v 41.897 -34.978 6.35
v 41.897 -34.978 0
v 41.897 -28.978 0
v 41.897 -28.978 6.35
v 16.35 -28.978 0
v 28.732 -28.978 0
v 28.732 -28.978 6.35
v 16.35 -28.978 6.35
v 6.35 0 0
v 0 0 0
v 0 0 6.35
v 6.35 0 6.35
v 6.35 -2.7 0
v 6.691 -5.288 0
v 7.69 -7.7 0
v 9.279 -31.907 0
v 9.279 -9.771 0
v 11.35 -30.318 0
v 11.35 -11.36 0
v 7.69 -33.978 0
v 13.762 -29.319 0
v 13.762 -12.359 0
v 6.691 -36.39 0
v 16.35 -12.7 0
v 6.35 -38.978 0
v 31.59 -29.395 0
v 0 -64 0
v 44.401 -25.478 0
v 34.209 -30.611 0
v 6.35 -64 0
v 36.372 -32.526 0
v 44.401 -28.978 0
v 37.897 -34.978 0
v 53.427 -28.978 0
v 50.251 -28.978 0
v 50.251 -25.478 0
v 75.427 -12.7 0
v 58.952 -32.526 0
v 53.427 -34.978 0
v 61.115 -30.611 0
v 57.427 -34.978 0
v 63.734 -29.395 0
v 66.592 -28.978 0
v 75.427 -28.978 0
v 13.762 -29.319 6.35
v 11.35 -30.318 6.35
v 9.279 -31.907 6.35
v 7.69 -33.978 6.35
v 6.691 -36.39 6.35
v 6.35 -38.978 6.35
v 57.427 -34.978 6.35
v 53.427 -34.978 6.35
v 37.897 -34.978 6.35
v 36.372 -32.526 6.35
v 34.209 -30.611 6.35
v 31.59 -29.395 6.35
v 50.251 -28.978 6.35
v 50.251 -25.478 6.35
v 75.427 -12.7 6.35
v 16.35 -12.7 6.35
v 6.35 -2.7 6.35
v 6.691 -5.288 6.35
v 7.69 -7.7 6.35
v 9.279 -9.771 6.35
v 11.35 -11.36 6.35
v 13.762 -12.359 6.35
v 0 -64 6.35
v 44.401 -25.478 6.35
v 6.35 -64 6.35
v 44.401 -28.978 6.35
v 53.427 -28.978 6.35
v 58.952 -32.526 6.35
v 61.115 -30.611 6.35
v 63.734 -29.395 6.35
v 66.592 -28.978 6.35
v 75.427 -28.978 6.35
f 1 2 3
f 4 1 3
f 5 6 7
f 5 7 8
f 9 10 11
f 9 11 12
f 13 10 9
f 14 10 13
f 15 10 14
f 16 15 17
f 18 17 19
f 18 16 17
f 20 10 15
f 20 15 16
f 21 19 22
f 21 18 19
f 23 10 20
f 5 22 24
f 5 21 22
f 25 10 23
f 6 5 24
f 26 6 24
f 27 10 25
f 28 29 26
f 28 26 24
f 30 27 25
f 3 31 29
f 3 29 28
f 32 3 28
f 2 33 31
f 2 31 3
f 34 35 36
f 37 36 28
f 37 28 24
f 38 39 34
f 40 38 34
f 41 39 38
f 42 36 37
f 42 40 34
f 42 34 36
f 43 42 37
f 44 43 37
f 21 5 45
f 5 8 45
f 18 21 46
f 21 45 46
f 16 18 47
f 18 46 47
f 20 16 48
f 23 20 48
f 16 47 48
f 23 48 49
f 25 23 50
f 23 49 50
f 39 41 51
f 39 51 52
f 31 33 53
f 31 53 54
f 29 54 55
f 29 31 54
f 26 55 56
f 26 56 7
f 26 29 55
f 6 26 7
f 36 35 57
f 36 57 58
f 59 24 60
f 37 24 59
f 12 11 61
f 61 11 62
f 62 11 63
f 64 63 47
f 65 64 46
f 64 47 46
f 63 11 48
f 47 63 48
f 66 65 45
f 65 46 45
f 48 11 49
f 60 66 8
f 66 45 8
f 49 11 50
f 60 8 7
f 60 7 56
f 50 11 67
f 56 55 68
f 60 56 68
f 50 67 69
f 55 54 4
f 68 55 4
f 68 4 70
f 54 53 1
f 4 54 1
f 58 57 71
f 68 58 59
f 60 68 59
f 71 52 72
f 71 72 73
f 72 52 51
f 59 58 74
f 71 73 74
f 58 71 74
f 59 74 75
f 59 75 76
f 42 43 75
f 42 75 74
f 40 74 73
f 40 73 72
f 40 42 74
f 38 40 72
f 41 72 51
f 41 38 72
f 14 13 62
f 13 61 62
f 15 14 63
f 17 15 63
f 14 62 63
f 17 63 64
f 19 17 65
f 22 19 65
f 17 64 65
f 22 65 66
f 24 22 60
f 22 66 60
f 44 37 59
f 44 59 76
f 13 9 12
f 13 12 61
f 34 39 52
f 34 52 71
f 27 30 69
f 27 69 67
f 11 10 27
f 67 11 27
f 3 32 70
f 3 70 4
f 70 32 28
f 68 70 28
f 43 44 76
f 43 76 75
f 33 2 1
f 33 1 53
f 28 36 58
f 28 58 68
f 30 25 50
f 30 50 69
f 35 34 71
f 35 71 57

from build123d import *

# Parameters (mm, degrees)
BOSS_EXTRUDE1_DEPTH = 6.35
FILLET1_R           = 10
SKETCH3_W           = 4
SKETCH3_H           = 6
BOSS_EXTRUDE2_DEPTH = 6.35
FILLET2_R           = 10
SKETCH4_W           = 5.85
SKETCH4_H           = 3.5
CUT_EXTRUDE1_DEPTH  = 10


with BuildPart() as part:
    # Sketch2 → Boss-Extrude1 (new body)
    with BuildSketch(Plane.XY):
        Polygon((0, -45.00147748), (0, 0), (6.35, 0), (6.35, -12.7), (75.42710801, -12.7), (75.42710801, -28.978), (6.35, -28.978), (6.35, -63.9998), (0, -63.9998), align=None)
    extrude(amount=BOSS_EXTRUDE1_DEPTH)

    # Fillet1
    fillet1_edges = [part.edges().sort_by_distance(p)[0] for p in [
        (6.35, -12.7, 3.175),
        (6.35, -28.978, 3.175),
    ]]
    fillet(fillet1_edges, radius=FILLET1_R)

    # Sketch3 → Boss-Extrude2 (add)
    with BuildSketch(Plane(origin=(0, 0, 0), x_dir=(-1, 0, 0), z_dir=(0, 0, -1))):
        with Locations((-39.89710801, -31.978)):
            Rectangle(SKETCH3_W, SKETCH3_H)
        with Locations((-55.42710801, -31.978)):
            Rectangle(SKETCH3_W, SKETCH3_H)
    extrude(amount=-BOSS_EXTRUDE2_DEPTH)

    # Fillet2
    # the kernel refuses this fillet: 10 mm, written as the material it adds along each edge
    with BuildSketch(Plane(origin=(57.42710801, -28.978, 0), x_dir=(1, 0, 0), z_dir=(0, 0, 1))) as fillet2_piece_1:
        with BuildLine():
            CenterArc((9.16515139, -10), FILLET2_R, 90, 66.421821522)
            Line((0, -6), (-0.183303028, -5.92))
            ThreePointArc((-0.183303028, -5.92), (-0.2, -3), (-0.2, 0))
            Line((-0.2, 0), (0, 0.2))
            Line((0, 0.2), (9.16515139, 0.2))
            Line((9.16515139, 0.2), (9.16515139, 0))
        make_face()
    extrude(amount=6.35)
    with BuildSketch(Plane(origin=(37.89710801, -28.978, 0), x_dir=(-1, 0, 0), z_dir=(0, 0, 1))) as fillet2_piece_2:
        with BuildLine():
            CenterArc((9.16515139, 10), FILLET2_R, 203.578178478, 66.421821522)
            Line((0, 6), (-0.183303028, 5.92))
            ThreePointArc((-0.183303028, 5.92), (-0.2, 3), (-0.2, 0))
            Line((-0.2, 0), (0, -0.2))
            Line((0, -0.2), (9.16515139, -0.2))
            Line((9.16515139, -0.2), (9.16515139, 0))
        make_face()
    extrude(amount=6.35)

    # Sketch4 → Cut-Extrude1 (cut)
    with BuildSketch(Plane(origin=(0, 0, 0), x_dir=(-1, 0, 0), z_dir=(0, 0, -1))):
        with Locations((-47.32560801, -27.228)):
            Rectangle(SKETCH4_W, SKETCH4_H)
    extrude(amount=-CUT_EXTRUDE1_DEPTH, mode=Mode.SUBTRACT)


solid = part.part
